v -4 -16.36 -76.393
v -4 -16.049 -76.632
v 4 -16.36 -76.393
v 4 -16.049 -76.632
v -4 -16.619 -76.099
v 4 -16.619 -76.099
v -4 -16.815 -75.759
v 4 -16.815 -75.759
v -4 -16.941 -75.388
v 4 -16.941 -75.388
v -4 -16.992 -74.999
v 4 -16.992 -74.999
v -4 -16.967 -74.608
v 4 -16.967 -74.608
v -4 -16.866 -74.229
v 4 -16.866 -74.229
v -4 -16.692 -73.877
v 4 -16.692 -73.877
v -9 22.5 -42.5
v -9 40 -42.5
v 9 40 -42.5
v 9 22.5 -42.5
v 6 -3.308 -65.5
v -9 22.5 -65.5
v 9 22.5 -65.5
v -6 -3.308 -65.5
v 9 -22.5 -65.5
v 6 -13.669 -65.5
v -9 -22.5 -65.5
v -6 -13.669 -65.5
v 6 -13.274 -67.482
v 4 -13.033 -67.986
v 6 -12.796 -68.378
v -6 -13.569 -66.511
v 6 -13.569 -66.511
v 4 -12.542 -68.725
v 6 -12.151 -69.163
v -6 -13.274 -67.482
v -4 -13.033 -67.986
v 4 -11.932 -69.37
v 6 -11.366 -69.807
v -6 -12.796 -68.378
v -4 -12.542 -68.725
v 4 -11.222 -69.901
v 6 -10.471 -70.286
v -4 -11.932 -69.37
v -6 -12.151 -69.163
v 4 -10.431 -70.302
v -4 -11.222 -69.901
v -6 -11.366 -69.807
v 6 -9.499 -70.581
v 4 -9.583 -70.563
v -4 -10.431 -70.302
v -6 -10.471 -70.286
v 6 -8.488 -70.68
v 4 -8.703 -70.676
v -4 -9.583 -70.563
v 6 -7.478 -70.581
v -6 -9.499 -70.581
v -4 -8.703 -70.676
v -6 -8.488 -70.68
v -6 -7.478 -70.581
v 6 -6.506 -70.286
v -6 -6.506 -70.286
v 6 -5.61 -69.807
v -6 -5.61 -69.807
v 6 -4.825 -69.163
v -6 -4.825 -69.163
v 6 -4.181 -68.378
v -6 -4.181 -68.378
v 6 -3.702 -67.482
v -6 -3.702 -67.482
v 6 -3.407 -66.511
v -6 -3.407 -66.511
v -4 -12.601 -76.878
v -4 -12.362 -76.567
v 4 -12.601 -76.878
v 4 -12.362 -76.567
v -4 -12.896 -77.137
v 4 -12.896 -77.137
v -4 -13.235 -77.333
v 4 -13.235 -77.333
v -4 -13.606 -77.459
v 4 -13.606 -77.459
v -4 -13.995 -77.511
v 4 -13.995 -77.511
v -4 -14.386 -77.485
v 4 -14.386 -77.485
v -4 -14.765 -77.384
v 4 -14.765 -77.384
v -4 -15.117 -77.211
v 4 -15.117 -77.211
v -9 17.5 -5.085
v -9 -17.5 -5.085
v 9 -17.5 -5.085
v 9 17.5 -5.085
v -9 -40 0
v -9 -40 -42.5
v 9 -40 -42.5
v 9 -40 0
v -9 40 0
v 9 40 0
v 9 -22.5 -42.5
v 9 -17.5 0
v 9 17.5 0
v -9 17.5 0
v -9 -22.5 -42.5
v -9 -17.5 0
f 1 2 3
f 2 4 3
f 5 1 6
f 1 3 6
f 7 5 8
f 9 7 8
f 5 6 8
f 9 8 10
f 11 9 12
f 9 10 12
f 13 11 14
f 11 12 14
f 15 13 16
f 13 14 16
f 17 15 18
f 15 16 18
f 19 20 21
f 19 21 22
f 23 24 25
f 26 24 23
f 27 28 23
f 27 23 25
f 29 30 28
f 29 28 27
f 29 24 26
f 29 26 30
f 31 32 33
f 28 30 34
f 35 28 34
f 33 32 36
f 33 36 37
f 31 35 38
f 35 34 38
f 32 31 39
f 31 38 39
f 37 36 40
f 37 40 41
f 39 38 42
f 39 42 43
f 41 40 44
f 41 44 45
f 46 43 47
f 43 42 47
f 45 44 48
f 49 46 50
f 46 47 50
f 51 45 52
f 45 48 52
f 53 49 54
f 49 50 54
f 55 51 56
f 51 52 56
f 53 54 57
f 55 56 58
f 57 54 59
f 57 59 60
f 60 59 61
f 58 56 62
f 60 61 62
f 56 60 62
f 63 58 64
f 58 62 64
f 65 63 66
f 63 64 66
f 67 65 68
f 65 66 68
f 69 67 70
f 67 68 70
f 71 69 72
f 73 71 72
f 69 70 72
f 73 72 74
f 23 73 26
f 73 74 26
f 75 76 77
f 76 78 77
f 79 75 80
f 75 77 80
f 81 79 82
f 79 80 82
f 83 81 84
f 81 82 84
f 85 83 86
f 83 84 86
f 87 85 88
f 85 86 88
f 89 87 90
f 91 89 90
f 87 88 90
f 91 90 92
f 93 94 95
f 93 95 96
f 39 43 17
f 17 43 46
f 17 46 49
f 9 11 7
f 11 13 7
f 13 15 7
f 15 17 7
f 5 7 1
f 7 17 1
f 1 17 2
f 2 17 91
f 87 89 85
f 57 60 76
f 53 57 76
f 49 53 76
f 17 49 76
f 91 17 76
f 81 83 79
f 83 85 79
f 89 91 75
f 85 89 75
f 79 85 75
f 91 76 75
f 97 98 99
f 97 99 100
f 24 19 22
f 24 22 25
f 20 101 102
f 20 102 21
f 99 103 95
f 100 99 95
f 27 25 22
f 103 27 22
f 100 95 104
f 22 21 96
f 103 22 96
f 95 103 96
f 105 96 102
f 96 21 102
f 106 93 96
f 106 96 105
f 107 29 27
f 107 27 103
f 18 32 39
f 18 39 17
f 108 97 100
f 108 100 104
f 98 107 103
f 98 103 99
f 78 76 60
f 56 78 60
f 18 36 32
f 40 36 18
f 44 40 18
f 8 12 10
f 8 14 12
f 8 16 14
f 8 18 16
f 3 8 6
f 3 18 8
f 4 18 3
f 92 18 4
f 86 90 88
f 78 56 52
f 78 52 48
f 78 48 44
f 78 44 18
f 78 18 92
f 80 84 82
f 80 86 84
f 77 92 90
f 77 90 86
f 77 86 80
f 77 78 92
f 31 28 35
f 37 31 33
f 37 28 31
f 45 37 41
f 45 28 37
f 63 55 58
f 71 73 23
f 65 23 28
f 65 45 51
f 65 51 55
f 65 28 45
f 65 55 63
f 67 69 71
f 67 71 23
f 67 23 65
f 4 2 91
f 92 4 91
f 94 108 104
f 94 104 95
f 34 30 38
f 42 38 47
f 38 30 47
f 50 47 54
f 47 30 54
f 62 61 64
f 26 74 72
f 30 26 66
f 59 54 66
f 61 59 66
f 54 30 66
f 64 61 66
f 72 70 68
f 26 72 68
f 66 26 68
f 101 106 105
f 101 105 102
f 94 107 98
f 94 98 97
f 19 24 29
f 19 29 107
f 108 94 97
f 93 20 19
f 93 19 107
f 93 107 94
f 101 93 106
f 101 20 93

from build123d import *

# Parameters (mm, degrees)
EXTRUDE_1_DEPTH      = 9
EXTRUDE_1_DEPTH_BACK = 9
EXTRUDE_2_DEPTH      = 6
EXTRUDE_2_DEPTH_BACK = 6
EXTRUDE_3_DEPTH      = 4
EXTRUDE_3_DEPTH_BACK = 4
FILLET_2_R           = 2


with BuildPart() as part:
    # 草图1 → 凸台-拉伸1 (new, two sides: drawn at the far end of the back side and taken through both)
    with BuildSketch(Plane(origin=(0, 0, 0), x_dir=(0, 0, -1), z_dir=(1, 0, 0)).offset(-EXTRUDE_1_DEPTH_BACK)):
        Polygon((0, 17.5), (0, 40), (42.5, 40), (42.5, 22.5), (65.5, 22.5), (65.5, -22.5), (42.5, -22.5), (42.5, -40), (0, -40), (0, -17.5), (5.084959992, -17.5), (5.084959992, 17.5), align=None)
    extrude(amount=EXTRUDE_1_DEPTH + EXTRUDE_1_DEPTH_BACK)

    # 草图2 → 凸台-拉伸2 (add, two sides: drawn at the far end of the back side and taken through both)
    with BuildSketch(Plane(origin=(0, 0, 0), x_dir=(0, 0, -1), z_dir=(1, 0, 0)).offset(-EXTRUDE_2_DEPTH_BACK)):
        with BuildLine():
            Line((65.5, -3.307764834), (65.5, -13.668635082))
            ThreePointArc((65.5, -13.668635082), (70.680435124, -8.488199958), (65.5, -3.307764834))
        make_face()
    extrude(amount=EXTRUDE_2_DEPTH + EXTRUDE_2_DEPTH_BACK)

    # 草图3 → 凸台-拉伸3 (add, two sides: drawn at the far end of the back side and taken through both)
    with BuildSketch(Plane(origin=(0, 0, 0), x_dir=(0, 0, -1), z_dir=(1, 0, 0)).offset(-EXTRUDE_3_DEPTH_BACK)):
        Polygon((69.816037918, -8.168812248), (67.126357089, -12.498830138), (75.576408791, -17.747755811), (78.26608962, -13.41773792), align=None)
    extrude(amount=EXTRUDE_3_DEPTH + EXTRUDE_3_DEPTH_BACK)

    # 圆角2
    fillet_2_edges = [part.edges().sort_by_distance(p)[0] for p in [
        (0, -17.747755811, -75.576408791),
        (0, -13.41773792, -78.26608962),
    ]]
    fillet(fillet_2_edges, radius=FILLET_2_R)


solid = part.part
